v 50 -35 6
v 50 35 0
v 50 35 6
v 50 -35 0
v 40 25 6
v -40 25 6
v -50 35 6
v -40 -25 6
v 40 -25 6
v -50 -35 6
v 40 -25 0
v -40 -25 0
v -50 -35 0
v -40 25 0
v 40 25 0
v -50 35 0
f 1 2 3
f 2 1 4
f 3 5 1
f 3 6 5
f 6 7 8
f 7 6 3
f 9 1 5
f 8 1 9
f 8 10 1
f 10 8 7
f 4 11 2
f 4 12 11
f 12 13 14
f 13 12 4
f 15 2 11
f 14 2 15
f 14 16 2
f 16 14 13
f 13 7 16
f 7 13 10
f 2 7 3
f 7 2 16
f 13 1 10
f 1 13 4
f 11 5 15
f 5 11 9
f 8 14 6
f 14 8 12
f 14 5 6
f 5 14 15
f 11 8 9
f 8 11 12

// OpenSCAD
outer_length = 100; outer_width = 70; thickness = 6; frame_width = 10;
difference() {
  translate([-outer_length/2, -outer_width/2, 0]) cube([outer_length, outer_width, thickness]);
  translate([-outer_length/2 + frame_width, -outer_width/2 + frame_width, -1])
    cube([outer_length - 2*frame_width, outer_width - 2*frame_width, thickness + 2]);
}
